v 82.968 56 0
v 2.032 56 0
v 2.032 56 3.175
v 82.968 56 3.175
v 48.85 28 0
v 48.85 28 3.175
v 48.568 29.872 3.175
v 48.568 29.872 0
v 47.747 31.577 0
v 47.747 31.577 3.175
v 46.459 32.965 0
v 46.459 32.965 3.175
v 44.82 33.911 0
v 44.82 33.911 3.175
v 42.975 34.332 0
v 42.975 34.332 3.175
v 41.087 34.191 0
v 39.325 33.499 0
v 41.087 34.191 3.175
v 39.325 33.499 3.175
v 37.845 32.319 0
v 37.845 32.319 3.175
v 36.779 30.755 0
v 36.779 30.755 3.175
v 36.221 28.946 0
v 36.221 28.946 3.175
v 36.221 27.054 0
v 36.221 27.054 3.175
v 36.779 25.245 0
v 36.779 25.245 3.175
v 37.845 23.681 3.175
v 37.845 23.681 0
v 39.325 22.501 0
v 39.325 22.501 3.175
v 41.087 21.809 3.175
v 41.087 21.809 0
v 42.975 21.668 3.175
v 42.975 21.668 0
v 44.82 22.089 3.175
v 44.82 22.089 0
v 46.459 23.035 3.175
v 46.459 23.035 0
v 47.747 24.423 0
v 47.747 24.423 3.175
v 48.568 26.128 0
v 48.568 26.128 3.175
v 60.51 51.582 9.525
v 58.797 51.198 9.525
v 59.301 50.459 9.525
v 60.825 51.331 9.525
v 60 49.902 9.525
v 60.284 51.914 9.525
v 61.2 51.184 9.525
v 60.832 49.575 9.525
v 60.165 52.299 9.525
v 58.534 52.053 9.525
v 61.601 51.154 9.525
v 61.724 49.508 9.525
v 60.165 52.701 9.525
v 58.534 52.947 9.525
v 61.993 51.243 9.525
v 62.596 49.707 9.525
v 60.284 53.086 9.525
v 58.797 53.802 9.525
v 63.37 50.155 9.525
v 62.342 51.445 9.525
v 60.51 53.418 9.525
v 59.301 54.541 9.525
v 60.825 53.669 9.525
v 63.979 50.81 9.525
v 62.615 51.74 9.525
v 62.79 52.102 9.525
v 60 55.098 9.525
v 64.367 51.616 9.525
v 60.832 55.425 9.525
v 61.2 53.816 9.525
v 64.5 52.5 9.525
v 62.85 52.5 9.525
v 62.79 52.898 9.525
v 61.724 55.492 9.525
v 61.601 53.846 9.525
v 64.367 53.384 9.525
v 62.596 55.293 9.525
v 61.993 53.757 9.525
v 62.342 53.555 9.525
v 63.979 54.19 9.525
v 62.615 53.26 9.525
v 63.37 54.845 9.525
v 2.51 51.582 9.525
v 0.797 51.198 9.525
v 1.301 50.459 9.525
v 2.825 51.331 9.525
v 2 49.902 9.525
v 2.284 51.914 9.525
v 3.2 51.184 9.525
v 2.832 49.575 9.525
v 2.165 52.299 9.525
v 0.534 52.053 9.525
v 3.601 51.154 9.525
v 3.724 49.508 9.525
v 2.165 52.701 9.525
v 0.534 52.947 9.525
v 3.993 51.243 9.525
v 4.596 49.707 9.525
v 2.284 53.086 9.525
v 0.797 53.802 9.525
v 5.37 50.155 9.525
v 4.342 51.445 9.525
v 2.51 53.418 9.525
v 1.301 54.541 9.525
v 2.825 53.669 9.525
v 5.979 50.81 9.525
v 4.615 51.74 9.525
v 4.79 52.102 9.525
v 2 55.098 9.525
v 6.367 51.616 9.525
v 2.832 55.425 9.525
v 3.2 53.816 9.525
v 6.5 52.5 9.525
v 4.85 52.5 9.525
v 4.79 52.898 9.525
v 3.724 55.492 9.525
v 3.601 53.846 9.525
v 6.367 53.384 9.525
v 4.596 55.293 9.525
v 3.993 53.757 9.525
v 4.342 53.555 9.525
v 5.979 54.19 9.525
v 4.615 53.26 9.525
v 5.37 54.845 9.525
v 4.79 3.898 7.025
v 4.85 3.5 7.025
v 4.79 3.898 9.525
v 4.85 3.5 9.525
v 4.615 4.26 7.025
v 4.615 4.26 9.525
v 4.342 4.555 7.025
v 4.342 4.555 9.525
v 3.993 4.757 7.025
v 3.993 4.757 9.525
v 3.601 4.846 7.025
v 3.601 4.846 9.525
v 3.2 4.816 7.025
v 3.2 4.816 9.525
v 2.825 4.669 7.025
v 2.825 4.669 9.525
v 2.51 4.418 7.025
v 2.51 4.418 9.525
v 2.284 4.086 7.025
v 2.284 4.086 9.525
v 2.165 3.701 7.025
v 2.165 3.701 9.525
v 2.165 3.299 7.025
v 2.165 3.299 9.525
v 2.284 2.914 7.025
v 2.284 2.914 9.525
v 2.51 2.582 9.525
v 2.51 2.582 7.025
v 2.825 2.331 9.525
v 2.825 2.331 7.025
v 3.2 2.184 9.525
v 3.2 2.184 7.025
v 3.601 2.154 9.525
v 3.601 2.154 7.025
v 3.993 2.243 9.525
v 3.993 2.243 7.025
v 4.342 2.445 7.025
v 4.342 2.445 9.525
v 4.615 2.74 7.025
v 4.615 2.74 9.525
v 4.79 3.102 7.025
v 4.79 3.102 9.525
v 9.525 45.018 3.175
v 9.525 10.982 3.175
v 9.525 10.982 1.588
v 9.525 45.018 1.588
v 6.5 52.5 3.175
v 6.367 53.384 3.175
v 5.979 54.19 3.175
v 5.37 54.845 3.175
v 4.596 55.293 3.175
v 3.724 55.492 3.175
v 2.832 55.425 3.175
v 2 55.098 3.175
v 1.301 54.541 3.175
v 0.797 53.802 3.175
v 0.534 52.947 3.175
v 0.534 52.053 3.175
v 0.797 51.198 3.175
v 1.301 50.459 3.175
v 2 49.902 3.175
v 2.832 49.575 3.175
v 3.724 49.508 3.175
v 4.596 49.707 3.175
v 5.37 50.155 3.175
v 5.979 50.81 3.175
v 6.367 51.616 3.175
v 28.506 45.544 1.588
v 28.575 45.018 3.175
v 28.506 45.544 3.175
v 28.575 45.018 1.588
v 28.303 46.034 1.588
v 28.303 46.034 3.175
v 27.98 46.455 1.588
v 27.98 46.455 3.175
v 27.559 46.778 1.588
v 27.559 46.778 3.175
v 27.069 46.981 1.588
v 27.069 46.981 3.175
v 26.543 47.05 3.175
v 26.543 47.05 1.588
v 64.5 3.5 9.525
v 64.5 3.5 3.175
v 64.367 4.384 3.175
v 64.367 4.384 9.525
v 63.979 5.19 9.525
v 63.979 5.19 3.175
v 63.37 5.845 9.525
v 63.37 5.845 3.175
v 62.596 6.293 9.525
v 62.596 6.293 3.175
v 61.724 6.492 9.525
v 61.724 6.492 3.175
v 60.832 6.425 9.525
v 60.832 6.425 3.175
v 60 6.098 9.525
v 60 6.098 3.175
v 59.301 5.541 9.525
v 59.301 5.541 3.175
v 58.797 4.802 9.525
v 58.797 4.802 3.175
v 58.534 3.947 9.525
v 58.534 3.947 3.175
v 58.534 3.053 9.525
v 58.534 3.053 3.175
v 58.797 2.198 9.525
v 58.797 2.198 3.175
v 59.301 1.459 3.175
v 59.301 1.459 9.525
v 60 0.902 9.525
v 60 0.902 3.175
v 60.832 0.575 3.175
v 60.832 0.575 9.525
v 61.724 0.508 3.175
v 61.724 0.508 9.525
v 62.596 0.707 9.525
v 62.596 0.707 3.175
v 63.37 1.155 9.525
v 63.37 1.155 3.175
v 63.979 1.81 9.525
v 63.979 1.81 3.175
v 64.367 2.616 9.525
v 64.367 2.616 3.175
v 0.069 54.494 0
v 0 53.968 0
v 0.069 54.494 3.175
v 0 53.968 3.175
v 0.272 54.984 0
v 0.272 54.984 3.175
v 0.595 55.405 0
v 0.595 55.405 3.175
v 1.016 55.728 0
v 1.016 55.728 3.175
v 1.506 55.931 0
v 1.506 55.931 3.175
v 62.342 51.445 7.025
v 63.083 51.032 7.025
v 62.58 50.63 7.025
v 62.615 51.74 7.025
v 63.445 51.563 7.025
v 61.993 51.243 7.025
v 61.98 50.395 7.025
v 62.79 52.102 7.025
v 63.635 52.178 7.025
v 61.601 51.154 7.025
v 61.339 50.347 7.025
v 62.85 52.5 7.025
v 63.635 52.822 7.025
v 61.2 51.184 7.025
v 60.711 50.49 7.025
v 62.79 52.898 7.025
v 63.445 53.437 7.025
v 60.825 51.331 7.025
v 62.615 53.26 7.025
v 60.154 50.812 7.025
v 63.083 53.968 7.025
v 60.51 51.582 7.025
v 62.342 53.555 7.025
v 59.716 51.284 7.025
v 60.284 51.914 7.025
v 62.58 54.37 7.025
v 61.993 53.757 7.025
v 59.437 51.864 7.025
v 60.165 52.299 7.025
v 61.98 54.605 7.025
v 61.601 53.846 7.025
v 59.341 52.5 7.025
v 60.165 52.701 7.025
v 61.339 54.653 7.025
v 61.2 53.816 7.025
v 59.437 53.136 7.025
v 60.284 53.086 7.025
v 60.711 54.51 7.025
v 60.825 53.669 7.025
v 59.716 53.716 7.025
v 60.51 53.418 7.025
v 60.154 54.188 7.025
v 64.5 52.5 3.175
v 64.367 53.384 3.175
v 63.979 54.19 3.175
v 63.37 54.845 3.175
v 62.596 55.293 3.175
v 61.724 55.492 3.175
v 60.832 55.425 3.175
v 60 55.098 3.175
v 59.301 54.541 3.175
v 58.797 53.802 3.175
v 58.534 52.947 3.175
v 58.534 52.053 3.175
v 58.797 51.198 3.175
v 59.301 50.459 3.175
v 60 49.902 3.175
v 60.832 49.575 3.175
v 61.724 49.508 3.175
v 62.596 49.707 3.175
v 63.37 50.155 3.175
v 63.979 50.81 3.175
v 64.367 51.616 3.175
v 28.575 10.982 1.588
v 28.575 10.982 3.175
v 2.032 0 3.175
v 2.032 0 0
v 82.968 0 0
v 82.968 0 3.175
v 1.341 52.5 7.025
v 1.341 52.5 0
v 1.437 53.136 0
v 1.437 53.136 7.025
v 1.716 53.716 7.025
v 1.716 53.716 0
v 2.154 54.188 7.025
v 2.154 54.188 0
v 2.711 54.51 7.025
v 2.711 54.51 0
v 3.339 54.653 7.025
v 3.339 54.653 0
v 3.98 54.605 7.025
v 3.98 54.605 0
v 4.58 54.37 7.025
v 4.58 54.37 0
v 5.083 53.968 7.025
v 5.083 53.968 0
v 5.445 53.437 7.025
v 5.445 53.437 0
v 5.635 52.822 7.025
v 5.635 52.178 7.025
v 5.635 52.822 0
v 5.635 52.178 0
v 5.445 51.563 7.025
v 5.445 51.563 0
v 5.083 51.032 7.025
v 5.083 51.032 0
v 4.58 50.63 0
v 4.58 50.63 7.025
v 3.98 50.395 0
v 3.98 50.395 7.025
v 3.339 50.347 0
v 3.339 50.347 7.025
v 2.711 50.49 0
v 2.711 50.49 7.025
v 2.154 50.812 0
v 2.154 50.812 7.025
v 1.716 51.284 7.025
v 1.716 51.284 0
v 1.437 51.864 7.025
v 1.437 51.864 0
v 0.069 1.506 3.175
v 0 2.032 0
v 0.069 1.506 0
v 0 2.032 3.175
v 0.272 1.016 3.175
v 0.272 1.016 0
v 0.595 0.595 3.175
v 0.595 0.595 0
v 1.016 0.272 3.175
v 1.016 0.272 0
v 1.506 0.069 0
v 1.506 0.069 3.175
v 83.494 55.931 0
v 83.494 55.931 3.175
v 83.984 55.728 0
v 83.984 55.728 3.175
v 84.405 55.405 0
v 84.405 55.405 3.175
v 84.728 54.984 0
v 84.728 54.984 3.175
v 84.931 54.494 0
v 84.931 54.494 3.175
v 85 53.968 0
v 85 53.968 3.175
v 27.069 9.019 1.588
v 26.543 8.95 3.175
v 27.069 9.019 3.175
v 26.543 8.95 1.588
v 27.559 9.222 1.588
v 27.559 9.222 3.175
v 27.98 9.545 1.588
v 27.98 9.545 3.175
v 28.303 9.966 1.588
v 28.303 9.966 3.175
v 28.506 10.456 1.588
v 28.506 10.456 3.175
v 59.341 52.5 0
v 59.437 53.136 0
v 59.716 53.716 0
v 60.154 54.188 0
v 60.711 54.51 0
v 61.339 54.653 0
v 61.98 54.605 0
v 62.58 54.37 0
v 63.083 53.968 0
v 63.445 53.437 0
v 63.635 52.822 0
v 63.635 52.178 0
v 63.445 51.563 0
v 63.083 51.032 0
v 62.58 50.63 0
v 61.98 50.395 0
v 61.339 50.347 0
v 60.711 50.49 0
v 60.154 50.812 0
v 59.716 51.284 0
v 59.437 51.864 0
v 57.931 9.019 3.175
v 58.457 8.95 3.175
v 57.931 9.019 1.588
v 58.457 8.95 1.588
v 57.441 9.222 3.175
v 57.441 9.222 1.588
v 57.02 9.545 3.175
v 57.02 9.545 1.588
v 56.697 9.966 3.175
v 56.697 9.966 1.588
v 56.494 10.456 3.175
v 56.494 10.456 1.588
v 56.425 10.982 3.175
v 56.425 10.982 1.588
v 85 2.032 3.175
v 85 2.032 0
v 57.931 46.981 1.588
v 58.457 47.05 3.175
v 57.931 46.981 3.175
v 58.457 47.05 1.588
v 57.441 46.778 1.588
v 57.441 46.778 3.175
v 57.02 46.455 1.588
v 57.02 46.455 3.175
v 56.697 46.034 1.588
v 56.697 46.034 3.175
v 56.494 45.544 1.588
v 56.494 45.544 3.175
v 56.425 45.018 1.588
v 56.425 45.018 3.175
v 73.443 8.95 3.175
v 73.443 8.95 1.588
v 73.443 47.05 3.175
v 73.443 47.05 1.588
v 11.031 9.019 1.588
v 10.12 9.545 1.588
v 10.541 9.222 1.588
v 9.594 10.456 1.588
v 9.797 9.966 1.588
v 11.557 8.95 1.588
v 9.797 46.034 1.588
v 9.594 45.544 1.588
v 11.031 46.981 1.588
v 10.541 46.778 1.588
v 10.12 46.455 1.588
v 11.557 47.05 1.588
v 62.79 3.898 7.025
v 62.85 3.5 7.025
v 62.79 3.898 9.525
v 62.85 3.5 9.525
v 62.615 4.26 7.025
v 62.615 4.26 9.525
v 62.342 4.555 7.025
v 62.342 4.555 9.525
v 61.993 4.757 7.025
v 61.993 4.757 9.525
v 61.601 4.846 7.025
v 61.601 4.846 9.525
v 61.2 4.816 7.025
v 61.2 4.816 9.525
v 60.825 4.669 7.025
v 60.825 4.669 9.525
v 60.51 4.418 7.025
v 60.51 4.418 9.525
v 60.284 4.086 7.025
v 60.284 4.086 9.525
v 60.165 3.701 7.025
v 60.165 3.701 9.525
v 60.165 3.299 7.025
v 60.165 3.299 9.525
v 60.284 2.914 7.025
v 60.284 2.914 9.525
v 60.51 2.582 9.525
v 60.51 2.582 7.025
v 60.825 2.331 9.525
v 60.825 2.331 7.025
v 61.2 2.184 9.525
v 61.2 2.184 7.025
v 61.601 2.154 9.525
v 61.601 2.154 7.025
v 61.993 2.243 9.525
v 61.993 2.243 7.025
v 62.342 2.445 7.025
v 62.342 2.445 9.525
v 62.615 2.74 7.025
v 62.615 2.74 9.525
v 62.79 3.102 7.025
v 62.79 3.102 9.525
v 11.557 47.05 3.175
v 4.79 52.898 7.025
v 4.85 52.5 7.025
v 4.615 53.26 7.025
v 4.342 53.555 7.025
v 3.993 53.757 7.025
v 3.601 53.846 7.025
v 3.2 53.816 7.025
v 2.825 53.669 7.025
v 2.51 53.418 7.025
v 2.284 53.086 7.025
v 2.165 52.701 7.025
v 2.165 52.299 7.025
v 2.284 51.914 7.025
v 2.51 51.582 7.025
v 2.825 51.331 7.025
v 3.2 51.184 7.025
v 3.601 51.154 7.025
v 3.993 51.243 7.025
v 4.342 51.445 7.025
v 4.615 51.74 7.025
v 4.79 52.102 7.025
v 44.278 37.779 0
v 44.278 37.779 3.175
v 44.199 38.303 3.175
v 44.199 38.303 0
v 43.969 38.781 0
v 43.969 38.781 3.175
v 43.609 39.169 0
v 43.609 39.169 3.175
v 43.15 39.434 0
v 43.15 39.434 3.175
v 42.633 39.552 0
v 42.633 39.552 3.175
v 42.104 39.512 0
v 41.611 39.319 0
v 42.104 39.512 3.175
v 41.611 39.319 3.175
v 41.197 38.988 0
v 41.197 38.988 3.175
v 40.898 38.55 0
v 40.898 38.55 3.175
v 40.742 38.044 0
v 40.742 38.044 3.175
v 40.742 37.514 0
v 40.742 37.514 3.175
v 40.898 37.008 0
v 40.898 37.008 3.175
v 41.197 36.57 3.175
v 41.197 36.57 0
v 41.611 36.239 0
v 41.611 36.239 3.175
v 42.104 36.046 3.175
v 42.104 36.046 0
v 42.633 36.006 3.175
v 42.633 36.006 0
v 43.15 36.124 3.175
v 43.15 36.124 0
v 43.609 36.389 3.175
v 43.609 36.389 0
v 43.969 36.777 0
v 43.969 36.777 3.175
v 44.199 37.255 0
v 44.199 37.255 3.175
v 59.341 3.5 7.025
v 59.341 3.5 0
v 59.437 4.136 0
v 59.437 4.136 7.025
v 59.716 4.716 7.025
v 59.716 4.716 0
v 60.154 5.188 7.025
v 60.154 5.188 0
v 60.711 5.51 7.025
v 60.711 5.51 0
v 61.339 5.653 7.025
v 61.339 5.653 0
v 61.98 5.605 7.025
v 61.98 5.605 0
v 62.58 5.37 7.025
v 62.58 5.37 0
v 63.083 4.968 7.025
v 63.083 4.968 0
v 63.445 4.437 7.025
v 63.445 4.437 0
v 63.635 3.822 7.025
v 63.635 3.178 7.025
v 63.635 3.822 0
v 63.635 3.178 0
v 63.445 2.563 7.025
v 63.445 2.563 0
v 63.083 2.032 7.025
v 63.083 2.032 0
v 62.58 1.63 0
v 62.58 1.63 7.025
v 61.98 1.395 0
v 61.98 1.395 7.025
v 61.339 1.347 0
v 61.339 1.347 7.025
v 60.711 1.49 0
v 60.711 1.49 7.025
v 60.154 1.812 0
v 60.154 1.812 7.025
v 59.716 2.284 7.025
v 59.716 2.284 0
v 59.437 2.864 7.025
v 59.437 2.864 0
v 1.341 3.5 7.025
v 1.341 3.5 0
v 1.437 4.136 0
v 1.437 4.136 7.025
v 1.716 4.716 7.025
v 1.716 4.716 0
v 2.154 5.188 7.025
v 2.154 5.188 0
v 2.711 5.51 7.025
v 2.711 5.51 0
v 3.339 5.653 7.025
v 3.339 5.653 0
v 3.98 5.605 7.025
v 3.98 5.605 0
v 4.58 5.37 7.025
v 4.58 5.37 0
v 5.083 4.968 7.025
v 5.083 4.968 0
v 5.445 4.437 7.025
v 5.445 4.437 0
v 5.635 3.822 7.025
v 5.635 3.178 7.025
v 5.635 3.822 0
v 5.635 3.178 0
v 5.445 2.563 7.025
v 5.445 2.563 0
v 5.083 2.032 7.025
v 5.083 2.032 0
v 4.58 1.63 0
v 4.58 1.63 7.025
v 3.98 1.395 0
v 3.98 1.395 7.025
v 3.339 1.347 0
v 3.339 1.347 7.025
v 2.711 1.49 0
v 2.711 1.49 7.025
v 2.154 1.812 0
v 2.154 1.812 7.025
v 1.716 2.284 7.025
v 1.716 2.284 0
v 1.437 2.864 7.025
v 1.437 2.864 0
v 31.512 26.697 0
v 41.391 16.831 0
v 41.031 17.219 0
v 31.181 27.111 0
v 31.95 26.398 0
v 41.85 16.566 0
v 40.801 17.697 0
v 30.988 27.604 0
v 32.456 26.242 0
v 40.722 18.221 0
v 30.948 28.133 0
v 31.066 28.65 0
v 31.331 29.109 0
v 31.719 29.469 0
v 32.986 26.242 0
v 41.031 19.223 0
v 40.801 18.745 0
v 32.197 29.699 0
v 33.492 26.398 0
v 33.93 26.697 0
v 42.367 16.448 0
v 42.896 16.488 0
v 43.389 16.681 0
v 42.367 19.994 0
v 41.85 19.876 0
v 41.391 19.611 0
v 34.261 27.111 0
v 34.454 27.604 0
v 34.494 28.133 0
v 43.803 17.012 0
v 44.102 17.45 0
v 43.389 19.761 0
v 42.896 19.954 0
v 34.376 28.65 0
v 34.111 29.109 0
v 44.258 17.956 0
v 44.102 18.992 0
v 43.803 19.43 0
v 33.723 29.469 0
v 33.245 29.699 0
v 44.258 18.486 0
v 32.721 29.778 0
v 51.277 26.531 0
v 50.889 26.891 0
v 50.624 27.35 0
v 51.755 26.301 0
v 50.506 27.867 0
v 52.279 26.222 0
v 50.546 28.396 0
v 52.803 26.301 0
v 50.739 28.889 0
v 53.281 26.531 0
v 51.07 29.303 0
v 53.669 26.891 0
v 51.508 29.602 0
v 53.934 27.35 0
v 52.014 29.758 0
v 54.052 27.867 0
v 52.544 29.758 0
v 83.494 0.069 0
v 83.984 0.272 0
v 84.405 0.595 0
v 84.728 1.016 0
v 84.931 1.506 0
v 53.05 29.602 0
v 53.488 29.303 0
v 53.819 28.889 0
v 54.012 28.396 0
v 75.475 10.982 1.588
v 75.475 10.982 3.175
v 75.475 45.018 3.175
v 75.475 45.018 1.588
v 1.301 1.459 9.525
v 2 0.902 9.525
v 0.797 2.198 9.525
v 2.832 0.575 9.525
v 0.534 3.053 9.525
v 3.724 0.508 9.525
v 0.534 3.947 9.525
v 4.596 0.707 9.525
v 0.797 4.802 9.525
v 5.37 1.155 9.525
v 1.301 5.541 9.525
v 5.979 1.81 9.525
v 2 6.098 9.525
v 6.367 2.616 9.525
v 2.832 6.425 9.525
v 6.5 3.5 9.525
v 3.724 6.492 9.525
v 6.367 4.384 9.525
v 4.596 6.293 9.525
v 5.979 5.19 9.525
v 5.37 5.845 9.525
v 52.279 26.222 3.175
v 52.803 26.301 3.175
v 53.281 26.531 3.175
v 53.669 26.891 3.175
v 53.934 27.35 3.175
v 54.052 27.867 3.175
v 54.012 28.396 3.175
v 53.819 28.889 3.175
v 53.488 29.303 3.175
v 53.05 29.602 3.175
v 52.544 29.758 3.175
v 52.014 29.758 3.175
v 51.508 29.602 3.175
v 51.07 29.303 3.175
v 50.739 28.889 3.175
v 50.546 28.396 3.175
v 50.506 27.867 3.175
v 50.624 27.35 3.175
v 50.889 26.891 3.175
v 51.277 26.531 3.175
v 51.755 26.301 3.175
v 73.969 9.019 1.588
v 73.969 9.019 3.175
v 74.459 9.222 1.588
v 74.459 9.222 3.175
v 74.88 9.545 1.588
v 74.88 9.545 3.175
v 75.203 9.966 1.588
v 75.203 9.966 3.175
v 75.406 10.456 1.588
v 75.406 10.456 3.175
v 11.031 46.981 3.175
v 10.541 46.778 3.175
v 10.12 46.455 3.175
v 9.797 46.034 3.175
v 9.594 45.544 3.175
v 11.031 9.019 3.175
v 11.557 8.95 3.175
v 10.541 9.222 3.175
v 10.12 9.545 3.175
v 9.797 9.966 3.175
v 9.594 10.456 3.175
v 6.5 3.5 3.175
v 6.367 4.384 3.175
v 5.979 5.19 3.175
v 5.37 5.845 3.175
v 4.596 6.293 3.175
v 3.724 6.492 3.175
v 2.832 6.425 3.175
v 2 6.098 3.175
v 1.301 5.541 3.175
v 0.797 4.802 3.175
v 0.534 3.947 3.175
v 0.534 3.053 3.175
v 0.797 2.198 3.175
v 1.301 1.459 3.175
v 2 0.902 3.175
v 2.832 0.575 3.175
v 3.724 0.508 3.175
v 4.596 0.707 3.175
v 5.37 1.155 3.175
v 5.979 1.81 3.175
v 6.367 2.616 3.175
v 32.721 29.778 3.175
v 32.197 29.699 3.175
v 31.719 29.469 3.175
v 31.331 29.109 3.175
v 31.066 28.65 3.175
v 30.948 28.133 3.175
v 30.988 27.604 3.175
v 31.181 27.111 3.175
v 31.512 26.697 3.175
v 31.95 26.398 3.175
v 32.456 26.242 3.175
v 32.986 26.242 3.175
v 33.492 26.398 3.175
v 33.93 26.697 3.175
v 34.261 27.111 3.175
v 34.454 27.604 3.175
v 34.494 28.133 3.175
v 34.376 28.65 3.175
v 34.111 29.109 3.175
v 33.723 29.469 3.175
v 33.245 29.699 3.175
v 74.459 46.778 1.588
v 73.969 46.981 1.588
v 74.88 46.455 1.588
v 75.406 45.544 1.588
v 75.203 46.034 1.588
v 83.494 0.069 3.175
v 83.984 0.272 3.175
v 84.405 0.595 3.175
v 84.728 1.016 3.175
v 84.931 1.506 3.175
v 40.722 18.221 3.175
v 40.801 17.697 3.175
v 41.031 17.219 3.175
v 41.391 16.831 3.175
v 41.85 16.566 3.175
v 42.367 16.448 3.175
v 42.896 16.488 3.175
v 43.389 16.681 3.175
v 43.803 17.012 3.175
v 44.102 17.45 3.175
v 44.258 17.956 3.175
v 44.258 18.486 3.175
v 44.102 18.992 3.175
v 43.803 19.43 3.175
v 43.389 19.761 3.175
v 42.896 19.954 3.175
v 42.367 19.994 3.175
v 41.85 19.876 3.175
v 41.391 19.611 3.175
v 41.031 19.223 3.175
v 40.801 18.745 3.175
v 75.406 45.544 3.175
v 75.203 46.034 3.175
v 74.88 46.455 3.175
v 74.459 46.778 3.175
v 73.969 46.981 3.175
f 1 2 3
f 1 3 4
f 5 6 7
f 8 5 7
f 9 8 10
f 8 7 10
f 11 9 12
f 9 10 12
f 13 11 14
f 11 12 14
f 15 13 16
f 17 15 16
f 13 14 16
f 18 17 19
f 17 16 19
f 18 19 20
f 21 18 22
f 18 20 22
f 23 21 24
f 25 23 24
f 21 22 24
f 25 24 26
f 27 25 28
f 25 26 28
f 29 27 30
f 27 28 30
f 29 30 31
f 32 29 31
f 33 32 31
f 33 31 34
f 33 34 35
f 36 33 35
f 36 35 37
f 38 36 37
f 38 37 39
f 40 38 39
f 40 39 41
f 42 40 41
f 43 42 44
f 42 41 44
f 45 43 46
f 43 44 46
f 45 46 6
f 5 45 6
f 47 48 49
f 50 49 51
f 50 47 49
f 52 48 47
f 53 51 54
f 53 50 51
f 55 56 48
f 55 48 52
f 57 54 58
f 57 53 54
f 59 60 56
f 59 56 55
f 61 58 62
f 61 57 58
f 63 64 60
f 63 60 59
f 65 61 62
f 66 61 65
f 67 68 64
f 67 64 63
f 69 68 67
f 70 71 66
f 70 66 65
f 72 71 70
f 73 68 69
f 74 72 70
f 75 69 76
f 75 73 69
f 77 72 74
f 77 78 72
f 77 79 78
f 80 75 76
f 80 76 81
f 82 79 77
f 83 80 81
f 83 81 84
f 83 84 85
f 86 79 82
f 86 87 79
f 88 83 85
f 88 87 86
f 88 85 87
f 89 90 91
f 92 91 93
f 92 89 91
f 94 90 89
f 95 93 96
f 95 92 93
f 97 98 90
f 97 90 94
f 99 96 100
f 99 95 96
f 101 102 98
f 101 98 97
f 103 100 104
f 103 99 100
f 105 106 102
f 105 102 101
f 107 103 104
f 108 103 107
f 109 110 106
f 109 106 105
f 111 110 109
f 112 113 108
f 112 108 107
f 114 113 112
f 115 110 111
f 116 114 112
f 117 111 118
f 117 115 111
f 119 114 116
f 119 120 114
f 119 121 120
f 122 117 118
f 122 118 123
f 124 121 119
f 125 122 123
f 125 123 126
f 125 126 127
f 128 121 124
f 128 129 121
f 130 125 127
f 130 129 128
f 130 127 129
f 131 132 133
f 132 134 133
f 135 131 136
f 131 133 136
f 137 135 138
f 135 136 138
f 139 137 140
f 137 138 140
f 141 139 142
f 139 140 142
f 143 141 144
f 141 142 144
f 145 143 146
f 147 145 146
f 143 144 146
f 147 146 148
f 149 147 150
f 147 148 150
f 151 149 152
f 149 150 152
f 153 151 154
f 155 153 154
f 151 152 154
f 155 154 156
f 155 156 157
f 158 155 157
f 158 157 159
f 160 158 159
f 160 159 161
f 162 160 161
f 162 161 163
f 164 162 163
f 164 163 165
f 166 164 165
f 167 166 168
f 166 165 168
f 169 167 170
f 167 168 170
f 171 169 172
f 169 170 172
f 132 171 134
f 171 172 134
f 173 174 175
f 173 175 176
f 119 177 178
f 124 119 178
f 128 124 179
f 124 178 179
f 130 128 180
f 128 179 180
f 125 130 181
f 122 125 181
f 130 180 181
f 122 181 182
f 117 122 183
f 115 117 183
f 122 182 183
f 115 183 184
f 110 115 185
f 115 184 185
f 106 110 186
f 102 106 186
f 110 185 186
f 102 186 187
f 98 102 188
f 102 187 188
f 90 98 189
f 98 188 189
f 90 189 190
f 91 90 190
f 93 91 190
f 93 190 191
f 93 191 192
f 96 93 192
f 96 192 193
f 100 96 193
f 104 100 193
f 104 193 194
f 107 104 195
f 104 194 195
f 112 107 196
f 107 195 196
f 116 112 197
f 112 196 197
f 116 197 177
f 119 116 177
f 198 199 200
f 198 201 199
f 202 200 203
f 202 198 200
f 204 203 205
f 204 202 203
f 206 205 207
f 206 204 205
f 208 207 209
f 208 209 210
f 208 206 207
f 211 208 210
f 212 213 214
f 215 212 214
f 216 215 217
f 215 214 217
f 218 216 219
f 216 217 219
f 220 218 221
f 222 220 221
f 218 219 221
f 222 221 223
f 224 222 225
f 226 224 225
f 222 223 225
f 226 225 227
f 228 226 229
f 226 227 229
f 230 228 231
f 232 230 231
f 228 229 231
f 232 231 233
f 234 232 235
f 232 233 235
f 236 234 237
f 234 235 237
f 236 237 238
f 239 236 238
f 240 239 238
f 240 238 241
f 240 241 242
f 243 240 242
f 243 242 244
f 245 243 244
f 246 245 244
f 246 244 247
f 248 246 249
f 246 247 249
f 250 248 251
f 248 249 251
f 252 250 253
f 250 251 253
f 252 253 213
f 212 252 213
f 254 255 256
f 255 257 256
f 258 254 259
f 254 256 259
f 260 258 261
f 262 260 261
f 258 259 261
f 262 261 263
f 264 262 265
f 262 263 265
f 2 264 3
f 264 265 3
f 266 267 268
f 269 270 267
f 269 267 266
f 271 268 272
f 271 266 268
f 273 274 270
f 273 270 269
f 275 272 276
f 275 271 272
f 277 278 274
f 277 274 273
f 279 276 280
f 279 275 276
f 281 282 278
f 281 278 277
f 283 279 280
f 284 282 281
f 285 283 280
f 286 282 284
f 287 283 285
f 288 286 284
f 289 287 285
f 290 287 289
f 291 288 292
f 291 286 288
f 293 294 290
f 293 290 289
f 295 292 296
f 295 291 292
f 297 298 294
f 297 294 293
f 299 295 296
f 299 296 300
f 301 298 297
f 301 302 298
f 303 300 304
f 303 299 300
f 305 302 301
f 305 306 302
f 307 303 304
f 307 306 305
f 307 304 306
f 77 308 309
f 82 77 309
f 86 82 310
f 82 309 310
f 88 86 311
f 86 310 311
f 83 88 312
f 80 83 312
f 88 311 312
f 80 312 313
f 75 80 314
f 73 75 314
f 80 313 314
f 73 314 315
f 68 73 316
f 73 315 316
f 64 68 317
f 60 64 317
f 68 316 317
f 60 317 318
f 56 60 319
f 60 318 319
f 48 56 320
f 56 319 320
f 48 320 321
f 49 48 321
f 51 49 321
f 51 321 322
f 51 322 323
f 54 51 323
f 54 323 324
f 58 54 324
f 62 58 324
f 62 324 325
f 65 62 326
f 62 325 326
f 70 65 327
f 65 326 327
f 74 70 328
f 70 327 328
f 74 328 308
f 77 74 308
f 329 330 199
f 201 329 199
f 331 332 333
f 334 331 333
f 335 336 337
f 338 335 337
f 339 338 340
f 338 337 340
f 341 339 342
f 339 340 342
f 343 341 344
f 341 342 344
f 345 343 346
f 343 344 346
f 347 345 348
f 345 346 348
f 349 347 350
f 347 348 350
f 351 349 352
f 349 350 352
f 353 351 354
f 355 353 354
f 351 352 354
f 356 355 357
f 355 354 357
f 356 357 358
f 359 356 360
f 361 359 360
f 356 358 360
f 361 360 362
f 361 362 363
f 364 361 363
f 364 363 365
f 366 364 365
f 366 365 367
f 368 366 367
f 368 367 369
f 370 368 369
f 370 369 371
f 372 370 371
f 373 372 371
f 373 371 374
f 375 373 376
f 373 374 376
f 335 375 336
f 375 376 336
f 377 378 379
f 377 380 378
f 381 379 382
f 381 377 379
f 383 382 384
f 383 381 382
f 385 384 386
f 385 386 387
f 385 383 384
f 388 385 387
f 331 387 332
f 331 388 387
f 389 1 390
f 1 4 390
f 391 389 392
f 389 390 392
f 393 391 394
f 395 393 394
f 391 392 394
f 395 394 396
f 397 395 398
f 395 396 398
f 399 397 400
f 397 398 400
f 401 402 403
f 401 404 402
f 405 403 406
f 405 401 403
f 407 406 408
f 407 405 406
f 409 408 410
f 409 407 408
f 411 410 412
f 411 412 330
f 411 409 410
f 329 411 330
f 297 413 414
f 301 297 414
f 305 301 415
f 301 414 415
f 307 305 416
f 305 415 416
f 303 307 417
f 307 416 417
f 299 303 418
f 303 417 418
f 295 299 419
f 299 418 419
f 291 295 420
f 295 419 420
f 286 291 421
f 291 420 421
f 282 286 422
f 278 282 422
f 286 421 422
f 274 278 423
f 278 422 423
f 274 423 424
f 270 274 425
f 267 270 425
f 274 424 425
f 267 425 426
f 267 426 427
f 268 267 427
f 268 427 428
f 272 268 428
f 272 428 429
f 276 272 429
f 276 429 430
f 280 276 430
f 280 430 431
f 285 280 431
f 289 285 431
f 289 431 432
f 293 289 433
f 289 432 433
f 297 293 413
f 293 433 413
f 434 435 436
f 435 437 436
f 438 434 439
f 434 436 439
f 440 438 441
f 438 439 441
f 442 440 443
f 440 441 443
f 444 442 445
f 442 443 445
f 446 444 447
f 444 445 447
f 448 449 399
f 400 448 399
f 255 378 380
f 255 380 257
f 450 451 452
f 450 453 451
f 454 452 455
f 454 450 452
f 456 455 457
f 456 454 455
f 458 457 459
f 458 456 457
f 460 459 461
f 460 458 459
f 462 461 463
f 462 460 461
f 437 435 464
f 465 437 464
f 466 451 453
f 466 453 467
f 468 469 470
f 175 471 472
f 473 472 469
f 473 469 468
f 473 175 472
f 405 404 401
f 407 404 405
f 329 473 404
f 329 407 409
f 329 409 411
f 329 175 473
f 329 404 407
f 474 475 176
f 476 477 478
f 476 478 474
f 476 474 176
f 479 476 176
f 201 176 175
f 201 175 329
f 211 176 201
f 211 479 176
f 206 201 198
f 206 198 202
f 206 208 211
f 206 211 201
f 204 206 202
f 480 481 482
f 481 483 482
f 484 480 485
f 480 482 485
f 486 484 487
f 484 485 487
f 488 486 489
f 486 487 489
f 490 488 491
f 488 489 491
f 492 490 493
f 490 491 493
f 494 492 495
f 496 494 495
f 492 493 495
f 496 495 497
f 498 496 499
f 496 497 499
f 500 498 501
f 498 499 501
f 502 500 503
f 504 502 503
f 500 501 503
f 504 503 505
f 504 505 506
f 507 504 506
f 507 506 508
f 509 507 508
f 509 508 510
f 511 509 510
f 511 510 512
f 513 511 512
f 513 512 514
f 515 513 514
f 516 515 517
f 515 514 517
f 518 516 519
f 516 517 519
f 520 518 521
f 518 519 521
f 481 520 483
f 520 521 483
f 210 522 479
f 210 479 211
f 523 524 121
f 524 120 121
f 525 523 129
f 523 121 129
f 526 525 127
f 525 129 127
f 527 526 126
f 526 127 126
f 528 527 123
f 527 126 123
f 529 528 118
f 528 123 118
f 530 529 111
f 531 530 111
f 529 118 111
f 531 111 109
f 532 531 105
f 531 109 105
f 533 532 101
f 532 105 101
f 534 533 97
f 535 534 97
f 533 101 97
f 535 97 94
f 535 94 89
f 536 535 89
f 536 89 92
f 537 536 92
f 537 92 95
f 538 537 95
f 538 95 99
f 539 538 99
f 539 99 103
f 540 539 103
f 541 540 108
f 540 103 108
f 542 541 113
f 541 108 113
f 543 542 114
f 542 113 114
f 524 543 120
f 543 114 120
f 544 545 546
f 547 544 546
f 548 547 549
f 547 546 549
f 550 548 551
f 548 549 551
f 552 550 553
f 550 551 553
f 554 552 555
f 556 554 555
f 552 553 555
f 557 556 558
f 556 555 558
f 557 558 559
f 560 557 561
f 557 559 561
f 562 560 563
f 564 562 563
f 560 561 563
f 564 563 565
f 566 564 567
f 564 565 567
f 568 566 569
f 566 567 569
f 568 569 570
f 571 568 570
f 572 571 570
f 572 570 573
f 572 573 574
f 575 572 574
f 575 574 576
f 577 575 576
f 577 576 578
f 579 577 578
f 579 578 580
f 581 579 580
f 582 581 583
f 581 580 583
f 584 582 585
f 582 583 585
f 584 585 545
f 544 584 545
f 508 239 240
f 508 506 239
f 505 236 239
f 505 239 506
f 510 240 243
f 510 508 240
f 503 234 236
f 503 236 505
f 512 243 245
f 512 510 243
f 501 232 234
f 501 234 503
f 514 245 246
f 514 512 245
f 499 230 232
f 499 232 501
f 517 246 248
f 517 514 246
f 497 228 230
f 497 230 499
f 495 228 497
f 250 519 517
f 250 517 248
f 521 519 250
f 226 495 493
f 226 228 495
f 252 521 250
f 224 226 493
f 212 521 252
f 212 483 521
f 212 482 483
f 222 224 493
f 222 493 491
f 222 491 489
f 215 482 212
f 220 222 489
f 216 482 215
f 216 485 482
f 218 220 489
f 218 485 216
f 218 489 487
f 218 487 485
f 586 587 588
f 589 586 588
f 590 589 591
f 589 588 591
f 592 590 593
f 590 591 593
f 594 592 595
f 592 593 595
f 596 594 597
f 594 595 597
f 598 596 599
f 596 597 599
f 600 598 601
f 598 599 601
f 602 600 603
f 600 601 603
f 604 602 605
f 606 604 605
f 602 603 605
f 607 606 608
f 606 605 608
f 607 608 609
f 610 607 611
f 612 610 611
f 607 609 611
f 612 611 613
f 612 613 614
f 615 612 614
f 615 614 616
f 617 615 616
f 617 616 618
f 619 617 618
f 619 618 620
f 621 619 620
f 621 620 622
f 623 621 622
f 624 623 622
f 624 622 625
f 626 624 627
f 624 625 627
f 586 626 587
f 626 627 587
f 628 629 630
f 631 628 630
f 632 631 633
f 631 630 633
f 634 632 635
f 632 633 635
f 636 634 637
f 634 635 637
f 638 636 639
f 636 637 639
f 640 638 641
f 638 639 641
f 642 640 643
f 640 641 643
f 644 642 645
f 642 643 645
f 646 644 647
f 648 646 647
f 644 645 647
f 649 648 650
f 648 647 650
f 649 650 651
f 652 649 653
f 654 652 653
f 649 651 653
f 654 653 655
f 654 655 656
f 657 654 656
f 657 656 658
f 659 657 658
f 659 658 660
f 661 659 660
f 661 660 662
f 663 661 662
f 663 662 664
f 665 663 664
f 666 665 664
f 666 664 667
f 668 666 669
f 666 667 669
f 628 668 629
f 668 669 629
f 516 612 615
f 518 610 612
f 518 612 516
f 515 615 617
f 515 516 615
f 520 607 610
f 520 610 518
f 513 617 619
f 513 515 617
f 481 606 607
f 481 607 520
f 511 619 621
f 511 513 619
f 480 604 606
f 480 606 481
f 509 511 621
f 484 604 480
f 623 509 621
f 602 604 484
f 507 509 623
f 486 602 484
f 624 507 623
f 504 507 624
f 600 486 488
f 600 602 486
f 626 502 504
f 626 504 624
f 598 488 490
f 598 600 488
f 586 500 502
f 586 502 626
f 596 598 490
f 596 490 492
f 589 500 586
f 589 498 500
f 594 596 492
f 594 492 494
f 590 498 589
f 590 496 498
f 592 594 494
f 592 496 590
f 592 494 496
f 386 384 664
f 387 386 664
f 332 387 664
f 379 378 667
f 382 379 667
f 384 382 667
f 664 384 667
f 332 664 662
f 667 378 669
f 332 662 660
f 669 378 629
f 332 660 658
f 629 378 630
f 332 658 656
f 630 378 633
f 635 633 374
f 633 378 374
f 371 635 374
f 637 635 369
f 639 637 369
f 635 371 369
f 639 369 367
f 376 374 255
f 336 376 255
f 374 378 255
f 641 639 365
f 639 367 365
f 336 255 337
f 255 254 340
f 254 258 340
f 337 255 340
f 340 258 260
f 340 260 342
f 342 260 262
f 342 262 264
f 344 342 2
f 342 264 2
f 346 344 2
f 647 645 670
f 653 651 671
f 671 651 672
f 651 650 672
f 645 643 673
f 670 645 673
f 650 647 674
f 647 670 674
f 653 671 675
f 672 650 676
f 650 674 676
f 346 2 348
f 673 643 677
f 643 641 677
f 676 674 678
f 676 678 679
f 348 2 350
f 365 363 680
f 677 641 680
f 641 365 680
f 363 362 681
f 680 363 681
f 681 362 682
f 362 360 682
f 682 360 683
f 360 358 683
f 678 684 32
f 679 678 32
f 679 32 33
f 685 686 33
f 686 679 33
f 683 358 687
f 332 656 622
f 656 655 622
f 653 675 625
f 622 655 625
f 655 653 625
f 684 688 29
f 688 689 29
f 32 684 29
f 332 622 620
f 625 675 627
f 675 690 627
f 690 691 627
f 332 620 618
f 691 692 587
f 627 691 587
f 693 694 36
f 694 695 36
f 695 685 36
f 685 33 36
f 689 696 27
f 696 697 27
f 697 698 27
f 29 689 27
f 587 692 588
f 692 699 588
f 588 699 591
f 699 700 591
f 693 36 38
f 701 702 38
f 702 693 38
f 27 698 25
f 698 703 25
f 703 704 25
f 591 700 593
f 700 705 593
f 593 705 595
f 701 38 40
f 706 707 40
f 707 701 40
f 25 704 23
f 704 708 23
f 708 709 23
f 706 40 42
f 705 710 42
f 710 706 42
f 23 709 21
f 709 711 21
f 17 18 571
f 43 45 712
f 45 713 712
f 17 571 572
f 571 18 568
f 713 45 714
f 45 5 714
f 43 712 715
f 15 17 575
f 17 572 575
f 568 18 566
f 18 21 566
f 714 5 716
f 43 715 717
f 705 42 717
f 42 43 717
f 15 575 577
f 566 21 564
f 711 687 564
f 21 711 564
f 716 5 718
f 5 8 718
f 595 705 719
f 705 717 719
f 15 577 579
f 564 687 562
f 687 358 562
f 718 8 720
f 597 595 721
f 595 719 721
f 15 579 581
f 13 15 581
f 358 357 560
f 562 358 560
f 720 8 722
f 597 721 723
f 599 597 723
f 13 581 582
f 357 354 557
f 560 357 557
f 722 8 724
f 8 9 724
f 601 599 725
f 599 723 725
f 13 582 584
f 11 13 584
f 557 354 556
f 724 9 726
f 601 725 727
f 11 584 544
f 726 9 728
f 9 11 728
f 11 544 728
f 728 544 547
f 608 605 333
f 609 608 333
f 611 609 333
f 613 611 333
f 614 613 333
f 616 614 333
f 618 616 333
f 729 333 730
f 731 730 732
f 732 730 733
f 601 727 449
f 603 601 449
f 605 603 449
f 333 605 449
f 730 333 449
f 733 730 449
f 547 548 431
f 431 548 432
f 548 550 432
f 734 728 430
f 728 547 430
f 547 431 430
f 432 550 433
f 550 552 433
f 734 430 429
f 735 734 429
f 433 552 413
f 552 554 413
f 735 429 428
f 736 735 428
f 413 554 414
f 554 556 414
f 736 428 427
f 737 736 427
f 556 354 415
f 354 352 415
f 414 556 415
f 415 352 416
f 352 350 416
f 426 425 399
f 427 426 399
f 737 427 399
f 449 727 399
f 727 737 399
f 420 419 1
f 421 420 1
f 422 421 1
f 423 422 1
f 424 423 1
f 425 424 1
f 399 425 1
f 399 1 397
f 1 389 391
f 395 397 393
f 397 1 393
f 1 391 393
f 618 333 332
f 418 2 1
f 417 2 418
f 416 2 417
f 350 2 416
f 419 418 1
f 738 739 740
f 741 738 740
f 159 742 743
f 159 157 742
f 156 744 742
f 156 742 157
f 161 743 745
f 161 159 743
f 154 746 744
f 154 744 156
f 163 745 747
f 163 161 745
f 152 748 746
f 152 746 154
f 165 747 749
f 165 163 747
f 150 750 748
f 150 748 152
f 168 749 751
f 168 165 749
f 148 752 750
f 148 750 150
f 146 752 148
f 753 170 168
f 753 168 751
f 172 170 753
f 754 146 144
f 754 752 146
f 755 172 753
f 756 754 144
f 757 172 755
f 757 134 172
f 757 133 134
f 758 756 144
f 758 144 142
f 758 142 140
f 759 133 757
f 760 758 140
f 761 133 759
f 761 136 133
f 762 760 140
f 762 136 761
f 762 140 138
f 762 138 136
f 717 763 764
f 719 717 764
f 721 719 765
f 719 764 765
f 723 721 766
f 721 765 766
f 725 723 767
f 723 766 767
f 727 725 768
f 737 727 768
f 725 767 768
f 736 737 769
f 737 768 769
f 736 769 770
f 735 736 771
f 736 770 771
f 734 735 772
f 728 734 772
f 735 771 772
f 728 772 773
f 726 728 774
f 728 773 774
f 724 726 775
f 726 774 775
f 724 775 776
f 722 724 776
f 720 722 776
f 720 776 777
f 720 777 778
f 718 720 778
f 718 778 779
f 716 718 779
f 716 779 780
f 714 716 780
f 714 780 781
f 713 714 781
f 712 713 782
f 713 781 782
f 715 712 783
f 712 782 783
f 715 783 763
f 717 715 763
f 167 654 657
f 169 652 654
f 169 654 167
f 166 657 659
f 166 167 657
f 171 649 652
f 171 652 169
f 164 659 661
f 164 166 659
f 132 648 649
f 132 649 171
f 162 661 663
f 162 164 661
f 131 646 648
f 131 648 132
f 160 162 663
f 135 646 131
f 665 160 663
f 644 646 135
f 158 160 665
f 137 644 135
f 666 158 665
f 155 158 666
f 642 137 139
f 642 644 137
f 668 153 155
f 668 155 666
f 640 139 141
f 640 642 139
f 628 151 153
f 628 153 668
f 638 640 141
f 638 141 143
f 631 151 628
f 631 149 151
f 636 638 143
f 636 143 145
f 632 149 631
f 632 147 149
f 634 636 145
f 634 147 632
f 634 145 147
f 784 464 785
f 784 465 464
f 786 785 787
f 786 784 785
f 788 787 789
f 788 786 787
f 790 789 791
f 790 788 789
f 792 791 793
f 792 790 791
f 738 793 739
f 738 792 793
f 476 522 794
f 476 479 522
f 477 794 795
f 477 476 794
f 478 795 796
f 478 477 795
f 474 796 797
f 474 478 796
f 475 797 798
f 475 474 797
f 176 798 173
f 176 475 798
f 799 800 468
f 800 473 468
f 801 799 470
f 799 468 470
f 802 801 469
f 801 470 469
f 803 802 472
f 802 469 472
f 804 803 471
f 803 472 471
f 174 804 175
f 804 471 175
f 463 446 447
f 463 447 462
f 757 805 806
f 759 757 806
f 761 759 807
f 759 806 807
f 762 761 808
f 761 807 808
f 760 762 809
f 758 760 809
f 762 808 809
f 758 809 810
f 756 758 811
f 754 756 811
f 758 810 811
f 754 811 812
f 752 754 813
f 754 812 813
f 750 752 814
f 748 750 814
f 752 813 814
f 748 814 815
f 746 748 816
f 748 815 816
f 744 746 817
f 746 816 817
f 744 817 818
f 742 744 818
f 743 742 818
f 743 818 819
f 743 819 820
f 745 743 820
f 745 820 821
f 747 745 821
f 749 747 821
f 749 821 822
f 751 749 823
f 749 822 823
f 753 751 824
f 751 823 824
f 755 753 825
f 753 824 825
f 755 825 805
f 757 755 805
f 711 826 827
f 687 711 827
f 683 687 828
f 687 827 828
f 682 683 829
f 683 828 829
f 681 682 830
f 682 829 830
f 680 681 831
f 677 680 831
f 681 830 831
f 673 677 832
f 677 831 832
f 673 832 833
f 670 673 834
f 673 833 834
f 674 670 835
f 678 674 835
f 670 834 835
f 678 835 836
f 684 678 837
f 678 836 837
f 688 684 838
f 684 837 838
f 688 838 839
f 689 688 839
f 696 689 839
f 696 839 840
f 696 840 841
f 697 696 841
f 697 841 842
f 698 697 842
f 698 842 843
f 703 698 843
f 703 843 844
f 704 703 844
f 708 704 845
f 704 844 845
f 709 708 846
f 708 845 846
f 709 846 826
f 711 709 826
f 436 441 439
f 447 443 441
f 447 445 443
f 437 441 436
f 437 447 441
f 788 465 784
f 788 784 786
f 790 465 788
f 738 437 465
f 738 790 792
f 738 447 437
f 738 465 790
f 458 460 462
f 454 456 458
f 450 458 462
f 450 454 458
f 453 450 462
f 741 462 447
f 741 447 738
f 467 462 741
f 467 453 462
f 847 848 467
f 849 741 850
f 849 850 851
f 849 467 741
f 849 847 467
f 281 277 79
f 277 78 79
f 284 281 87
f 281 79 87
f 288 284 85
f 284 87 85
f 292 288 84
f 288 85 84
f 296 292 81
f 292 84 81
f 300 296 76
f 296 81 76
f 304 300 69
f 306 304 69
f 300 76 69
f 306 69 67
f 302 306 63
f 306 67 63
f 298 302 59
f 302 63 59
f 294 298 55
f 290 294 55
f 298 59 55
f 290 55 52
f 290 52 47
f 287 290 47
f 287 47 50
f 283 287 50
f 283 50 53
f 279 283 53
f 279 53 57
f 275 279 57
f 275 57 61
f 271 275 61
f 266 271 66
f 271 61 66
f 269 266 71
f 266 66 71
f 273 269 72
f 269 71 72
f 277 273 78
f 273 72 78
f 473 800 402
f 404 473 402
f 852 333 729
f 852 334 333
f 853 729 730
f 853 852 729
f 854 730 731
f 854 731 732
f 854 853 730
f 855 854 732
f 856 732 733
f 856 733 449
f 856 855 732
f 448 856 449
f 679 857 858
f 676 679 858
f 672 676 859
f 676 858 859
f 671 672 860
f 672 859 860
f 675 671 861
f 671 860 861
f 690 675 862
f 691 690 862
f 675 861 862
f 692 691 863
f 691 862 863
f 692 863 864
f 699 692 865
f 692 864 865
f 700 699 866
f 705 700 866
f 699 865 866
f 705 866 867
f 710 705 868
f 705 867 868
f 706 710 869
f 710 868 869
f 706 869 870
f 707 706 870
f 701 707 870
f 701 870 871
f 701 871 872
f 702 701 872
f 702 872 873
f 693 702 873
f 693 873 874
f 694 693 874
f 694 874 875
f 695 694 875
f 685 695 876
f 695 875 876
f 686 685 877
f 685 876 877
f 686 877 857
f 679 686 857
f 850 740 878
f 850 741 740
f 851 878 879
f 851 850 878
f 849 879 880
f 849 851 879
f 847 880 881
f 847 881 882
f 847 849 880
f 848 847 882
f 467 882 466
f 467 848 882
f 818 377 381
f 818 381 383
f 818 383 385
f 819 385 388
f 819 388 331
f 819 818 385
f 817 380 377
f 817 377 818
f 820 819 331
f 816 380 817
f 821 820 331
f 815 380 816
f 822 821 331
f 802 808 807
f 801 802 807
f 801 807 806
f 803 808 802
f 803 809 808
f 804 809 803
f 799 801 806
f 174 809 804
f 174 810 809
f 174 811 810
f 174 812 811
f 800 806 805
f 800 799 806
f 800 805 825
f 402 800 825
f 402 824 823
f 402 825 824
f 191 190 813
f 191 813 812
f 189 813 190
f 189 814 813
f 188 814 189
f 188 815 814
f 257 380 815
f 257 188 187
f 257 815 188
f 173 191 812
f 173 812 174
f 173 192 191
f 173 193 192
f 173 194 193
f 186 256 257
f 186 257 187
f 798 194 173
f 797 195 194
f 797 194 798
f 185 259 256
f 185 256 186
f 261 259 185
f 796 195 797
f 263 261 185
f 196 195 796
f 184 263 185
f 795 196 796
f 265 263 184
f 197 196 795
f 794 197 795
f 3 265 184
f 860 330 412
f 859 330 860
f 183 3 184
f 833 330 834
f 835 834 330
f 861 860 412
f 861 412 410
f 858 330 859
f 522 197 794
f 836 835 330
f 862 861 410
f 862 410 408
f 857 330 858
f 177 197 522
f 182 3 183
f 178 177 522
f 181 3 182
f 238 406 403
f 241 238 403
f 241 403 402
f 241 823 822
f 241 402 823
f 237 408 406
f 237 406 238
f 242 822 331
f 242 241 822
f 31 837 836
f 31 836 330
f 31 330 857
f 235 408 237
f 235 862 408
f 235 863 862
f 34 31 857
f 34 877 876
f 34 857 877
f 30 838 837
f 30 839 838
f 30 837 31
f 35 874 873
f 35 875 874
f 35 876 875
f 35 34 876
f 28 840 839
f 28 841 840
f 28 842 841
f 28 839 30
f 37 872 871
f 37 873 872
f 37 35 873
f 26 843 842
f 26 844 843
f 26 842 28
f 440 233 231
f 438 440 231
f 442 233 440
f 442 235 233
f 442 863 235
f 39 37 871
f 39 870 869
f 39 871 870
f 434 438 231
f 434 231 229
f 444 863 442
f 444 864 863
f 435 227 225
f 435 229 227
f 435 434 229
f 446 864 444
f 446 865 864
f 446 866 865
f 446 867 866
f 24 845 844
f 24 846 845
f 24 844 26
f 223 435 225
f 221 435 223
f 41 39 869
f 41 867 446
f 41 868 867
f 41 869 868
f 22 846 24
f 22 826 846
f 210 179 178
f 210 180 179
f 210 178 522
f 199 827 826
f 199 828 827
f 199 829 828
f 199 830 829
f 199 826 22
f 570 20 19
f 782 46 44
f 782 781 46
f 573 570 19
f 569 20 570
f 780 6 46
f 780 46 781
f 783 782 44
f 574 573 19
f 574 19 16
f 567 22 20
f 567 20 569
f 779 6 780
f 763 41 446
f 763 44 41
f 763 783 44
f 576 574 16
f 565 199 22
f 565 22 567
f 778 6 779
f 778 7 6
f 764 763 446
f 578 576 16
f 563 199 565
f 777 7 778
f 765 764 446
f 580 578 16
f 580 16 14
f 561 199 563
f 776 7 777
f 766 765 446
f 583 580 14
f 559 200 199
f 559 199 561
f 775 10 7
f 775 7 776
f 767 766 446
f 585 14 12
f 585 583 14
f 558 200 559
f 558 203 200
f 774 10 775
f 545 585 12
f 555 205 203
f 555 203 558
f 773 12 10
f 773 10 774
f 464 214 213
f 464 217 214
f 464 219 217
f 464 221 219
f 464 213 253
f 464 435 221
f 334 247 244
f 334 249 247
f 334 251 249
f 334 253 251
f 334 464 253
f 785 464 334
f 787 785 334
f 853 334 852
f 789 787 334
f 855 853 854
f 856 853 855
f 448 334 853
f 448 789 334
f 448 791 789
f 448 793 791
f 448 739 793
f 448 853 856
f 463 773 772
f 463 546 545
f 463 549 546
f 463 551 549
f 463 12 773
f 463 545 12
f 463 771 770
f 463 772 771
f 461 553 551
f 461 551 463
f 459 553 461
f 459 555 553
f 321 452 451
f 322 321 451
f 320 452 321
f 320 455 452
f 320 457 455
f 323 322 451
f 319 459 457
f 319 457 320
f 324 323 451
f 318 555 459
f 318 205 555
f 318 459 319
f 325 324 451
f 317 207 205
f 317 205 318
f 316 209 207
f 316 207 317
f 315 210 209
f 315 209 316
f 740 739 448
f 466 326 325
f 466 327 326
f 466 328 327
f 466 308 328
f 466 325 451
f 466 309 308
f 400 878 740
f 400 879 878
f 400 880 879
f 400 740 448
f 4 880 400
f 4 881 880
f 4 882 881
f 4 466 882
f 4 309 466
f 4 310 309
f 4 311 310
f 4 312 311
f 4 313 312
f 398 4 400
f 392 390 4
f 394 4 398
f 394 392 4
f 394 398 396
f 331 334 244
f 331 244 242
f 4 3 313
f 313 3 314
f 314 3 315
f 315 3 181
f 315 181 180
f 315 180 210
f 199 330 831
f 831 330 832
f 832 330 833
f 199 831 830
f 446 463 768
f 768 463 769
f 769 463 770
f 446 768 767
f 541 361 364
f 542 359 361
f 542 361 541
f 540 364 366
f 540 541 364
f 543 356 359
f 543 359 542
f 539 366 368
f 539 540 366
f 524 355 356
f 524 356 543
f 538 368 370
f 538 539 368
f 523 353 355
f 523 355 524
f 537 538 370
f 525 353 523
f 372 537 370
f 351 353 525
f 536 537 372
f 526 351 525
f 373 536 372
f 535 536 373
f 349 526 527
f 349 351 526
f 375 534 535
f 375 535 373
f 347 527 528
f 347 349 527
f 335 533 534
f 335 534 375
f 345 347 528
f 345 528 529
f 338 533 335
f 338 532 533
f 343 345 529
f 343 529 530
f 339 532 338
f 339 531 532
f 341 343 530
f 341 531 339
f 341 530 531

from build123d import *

# Parameters (mm, degrees)
SKETCH1_W               = 85
SKETCH1_H               = 56
BOSS_EXTRUDE1_DEPTH     = 3.175
SKETCH2_R               = 6.35
CUT_EXTRUDE1_DEPTH      = 3.175
SKETCH3_R               = 1.778
CUT_EXTRUDE2_DEPTH      = 3.175
CIRPATTERN1_COUNT       = 4
SKETCH4_R               = 3
BOSS_EXTRUDE2_DEPTH     = 6.35
SKETCH6_R               = 1.349999967
CUT_EXTRUDE3_DEPTH      = 7.35
CUT_EXTRUDE3_DEPTH_BACK = 4.175
SKETCH7_R               = 2.159
CUT_EXTRUDE4_DEPTH      = 7.025
SKETCH8_W               = 19.05
SKETCH8_H               = 38.1
CUT_EXTRUDE5_DEPTH      = 1.5875
FILLET1_R               = 2.032


with BuildPart() as part:
    # Sketch1 → Boss-Extrude1 (new body)
    with BuildSketch(Plane.XY):
        with Locations((42.5, 28)):
            Rectangle(SKETCH1_W, SKETCH1_H)
    extrude(amount=BOSS_EXTRUDE1_DEPTH)

    # Sketch2 → Cut-Extrude1 (cut)
    with BuildSketch(Plane.XY.offset(3.175)):
        with Locations((42.5, 28)):
            Circle(SKETCH2_R)
    extrude(amount=-CUT_EXTRUDE1_DEPTH, mode=Mode.SUBTRACT)

    # Sketch3 → Cut-Extrude2 (cut)
    with BuildSketch(Plane.XY.offset(3.175)):
        with Locations((42.5, 37.779)):
            Circle(SKETCH3_R)
    cut_extrude2 = extrude(amount=-CUT_EXTRUDE2_DEPTH, mode=Mode.SUBTRACT)

    # CirPattern1: Cut-Extrude2 ×4 about axis
    cirpattern1_axis = Axis((42.5, 28, 0), (0, 0, 1))
    for i in range(1, CIRPATTERN1_COUNT):
        add(cut_extrude2.rotate(cirpattern1_axis, i * 360 / CIRPATTERN1_COUNT), mode=Mode.SUBTRACT)

    # Sketch4 → Boss-Extrude2 (add)
    with BuildSketch(Plane.XY.offset(3.175)):
        with Locations((3.5, 52.5)):
            Circle(SKETCH4_R)
        with Locations((3.5, 3.5)):
            Circle(SKETCH4_R)
        with Locations((61.5, 52.5)):
            Circle(SKETCH4_R)
        with Locations((61.5, 3.5)):
            Circle(SKETCH4_R)
    extrude(amount=BOSS_EXTRUDE2_DEPTH)

    # Sketch6 → Cut-Extrude3 (cut, two sides)
    with BuildSketch(Plane.XY.offset(3.175)) as cut_extrude3_sk:
        with Locations((3.5, 3.5)):
            Circle(SKETCH6_R)
        with Locations((61.5, 3.5)):
            Circle(SKETCH6_R)
        with Locations((61.5, 52.5)):
            Circle(SKETCH6_R)
        with Locations((3.5, 52.5)):
            Circle(SKETCH6_R)
    extrude(amount=CUT_EXTRUDE3_DEPTH, mode=Mode.SUBTRACT)
    extrude(cut_extrude3_sk.sketch, amount=-CUT_EXTRUDE3_DEPTH_BACK, mode=Mode.SUBTRACT)

    # Sketch7 → Cut-Extrude4 (cut)
    with BuildSketch(Plane(origin=(0, 0, 0), x_dir=(-1, 0, 0), z_dir=(0, 0, -1))):
        with Locations((-61.5, 52.5)):
            Circle(SKETCH7_R)
        with Locations((-3.5, 52.5)):
            Circle(SKETCH7_R)
        with Locations((-3.5, 3.5)):
            Circle(SKETCH7_R)
        with Locations((-61.5, 3.5)):
            Circle(SKETCH7_R)
    extrude(amount=-CUT_EXTRUDE4_DEPTH, mode=Mode.SUBTRACT)

    # Sketch8 → Cut-Extrude5 (cut)
    with BuildSketch(Plane.XY.offset(3.175)):
        with Locations((19.05, 28)):
            Rectangle(SKETCH8_W, SKETCH8_H)
        with Locations((65.95, 28)):
            Rectangle(SKETCH8_W, SKETCH8_H)
    extrude(amount=-CUT_EXTRUDE5_DEPTH, mode=Mode.SUBTRACT)

    # Fillet1
    fillet1_edges = [part.edges().sort_by_distance(p)[0] for p in [
        (9.525, 8.95, 2.38125),
        (9.525, 47.05, 2.38125),
        (28.575, 47.05, 2.38125),
        (28.575, 8.95, 2.38125),
        (56.425, 8.95, 2.38125),
        (56.425, 47.05, 2.38125),
        (75.475, 47.05, 2.38125),
        (75.475, 8.95, 2.38125),
        (0, 56, 1.5875),
        (85, 56, 1.5875),
        (85, 0, 1.5875),
        (0, 0, 1.5875),
    ]]
    fillet(fillet1_edges, radius=FILLET1_R)


solid = part.part
